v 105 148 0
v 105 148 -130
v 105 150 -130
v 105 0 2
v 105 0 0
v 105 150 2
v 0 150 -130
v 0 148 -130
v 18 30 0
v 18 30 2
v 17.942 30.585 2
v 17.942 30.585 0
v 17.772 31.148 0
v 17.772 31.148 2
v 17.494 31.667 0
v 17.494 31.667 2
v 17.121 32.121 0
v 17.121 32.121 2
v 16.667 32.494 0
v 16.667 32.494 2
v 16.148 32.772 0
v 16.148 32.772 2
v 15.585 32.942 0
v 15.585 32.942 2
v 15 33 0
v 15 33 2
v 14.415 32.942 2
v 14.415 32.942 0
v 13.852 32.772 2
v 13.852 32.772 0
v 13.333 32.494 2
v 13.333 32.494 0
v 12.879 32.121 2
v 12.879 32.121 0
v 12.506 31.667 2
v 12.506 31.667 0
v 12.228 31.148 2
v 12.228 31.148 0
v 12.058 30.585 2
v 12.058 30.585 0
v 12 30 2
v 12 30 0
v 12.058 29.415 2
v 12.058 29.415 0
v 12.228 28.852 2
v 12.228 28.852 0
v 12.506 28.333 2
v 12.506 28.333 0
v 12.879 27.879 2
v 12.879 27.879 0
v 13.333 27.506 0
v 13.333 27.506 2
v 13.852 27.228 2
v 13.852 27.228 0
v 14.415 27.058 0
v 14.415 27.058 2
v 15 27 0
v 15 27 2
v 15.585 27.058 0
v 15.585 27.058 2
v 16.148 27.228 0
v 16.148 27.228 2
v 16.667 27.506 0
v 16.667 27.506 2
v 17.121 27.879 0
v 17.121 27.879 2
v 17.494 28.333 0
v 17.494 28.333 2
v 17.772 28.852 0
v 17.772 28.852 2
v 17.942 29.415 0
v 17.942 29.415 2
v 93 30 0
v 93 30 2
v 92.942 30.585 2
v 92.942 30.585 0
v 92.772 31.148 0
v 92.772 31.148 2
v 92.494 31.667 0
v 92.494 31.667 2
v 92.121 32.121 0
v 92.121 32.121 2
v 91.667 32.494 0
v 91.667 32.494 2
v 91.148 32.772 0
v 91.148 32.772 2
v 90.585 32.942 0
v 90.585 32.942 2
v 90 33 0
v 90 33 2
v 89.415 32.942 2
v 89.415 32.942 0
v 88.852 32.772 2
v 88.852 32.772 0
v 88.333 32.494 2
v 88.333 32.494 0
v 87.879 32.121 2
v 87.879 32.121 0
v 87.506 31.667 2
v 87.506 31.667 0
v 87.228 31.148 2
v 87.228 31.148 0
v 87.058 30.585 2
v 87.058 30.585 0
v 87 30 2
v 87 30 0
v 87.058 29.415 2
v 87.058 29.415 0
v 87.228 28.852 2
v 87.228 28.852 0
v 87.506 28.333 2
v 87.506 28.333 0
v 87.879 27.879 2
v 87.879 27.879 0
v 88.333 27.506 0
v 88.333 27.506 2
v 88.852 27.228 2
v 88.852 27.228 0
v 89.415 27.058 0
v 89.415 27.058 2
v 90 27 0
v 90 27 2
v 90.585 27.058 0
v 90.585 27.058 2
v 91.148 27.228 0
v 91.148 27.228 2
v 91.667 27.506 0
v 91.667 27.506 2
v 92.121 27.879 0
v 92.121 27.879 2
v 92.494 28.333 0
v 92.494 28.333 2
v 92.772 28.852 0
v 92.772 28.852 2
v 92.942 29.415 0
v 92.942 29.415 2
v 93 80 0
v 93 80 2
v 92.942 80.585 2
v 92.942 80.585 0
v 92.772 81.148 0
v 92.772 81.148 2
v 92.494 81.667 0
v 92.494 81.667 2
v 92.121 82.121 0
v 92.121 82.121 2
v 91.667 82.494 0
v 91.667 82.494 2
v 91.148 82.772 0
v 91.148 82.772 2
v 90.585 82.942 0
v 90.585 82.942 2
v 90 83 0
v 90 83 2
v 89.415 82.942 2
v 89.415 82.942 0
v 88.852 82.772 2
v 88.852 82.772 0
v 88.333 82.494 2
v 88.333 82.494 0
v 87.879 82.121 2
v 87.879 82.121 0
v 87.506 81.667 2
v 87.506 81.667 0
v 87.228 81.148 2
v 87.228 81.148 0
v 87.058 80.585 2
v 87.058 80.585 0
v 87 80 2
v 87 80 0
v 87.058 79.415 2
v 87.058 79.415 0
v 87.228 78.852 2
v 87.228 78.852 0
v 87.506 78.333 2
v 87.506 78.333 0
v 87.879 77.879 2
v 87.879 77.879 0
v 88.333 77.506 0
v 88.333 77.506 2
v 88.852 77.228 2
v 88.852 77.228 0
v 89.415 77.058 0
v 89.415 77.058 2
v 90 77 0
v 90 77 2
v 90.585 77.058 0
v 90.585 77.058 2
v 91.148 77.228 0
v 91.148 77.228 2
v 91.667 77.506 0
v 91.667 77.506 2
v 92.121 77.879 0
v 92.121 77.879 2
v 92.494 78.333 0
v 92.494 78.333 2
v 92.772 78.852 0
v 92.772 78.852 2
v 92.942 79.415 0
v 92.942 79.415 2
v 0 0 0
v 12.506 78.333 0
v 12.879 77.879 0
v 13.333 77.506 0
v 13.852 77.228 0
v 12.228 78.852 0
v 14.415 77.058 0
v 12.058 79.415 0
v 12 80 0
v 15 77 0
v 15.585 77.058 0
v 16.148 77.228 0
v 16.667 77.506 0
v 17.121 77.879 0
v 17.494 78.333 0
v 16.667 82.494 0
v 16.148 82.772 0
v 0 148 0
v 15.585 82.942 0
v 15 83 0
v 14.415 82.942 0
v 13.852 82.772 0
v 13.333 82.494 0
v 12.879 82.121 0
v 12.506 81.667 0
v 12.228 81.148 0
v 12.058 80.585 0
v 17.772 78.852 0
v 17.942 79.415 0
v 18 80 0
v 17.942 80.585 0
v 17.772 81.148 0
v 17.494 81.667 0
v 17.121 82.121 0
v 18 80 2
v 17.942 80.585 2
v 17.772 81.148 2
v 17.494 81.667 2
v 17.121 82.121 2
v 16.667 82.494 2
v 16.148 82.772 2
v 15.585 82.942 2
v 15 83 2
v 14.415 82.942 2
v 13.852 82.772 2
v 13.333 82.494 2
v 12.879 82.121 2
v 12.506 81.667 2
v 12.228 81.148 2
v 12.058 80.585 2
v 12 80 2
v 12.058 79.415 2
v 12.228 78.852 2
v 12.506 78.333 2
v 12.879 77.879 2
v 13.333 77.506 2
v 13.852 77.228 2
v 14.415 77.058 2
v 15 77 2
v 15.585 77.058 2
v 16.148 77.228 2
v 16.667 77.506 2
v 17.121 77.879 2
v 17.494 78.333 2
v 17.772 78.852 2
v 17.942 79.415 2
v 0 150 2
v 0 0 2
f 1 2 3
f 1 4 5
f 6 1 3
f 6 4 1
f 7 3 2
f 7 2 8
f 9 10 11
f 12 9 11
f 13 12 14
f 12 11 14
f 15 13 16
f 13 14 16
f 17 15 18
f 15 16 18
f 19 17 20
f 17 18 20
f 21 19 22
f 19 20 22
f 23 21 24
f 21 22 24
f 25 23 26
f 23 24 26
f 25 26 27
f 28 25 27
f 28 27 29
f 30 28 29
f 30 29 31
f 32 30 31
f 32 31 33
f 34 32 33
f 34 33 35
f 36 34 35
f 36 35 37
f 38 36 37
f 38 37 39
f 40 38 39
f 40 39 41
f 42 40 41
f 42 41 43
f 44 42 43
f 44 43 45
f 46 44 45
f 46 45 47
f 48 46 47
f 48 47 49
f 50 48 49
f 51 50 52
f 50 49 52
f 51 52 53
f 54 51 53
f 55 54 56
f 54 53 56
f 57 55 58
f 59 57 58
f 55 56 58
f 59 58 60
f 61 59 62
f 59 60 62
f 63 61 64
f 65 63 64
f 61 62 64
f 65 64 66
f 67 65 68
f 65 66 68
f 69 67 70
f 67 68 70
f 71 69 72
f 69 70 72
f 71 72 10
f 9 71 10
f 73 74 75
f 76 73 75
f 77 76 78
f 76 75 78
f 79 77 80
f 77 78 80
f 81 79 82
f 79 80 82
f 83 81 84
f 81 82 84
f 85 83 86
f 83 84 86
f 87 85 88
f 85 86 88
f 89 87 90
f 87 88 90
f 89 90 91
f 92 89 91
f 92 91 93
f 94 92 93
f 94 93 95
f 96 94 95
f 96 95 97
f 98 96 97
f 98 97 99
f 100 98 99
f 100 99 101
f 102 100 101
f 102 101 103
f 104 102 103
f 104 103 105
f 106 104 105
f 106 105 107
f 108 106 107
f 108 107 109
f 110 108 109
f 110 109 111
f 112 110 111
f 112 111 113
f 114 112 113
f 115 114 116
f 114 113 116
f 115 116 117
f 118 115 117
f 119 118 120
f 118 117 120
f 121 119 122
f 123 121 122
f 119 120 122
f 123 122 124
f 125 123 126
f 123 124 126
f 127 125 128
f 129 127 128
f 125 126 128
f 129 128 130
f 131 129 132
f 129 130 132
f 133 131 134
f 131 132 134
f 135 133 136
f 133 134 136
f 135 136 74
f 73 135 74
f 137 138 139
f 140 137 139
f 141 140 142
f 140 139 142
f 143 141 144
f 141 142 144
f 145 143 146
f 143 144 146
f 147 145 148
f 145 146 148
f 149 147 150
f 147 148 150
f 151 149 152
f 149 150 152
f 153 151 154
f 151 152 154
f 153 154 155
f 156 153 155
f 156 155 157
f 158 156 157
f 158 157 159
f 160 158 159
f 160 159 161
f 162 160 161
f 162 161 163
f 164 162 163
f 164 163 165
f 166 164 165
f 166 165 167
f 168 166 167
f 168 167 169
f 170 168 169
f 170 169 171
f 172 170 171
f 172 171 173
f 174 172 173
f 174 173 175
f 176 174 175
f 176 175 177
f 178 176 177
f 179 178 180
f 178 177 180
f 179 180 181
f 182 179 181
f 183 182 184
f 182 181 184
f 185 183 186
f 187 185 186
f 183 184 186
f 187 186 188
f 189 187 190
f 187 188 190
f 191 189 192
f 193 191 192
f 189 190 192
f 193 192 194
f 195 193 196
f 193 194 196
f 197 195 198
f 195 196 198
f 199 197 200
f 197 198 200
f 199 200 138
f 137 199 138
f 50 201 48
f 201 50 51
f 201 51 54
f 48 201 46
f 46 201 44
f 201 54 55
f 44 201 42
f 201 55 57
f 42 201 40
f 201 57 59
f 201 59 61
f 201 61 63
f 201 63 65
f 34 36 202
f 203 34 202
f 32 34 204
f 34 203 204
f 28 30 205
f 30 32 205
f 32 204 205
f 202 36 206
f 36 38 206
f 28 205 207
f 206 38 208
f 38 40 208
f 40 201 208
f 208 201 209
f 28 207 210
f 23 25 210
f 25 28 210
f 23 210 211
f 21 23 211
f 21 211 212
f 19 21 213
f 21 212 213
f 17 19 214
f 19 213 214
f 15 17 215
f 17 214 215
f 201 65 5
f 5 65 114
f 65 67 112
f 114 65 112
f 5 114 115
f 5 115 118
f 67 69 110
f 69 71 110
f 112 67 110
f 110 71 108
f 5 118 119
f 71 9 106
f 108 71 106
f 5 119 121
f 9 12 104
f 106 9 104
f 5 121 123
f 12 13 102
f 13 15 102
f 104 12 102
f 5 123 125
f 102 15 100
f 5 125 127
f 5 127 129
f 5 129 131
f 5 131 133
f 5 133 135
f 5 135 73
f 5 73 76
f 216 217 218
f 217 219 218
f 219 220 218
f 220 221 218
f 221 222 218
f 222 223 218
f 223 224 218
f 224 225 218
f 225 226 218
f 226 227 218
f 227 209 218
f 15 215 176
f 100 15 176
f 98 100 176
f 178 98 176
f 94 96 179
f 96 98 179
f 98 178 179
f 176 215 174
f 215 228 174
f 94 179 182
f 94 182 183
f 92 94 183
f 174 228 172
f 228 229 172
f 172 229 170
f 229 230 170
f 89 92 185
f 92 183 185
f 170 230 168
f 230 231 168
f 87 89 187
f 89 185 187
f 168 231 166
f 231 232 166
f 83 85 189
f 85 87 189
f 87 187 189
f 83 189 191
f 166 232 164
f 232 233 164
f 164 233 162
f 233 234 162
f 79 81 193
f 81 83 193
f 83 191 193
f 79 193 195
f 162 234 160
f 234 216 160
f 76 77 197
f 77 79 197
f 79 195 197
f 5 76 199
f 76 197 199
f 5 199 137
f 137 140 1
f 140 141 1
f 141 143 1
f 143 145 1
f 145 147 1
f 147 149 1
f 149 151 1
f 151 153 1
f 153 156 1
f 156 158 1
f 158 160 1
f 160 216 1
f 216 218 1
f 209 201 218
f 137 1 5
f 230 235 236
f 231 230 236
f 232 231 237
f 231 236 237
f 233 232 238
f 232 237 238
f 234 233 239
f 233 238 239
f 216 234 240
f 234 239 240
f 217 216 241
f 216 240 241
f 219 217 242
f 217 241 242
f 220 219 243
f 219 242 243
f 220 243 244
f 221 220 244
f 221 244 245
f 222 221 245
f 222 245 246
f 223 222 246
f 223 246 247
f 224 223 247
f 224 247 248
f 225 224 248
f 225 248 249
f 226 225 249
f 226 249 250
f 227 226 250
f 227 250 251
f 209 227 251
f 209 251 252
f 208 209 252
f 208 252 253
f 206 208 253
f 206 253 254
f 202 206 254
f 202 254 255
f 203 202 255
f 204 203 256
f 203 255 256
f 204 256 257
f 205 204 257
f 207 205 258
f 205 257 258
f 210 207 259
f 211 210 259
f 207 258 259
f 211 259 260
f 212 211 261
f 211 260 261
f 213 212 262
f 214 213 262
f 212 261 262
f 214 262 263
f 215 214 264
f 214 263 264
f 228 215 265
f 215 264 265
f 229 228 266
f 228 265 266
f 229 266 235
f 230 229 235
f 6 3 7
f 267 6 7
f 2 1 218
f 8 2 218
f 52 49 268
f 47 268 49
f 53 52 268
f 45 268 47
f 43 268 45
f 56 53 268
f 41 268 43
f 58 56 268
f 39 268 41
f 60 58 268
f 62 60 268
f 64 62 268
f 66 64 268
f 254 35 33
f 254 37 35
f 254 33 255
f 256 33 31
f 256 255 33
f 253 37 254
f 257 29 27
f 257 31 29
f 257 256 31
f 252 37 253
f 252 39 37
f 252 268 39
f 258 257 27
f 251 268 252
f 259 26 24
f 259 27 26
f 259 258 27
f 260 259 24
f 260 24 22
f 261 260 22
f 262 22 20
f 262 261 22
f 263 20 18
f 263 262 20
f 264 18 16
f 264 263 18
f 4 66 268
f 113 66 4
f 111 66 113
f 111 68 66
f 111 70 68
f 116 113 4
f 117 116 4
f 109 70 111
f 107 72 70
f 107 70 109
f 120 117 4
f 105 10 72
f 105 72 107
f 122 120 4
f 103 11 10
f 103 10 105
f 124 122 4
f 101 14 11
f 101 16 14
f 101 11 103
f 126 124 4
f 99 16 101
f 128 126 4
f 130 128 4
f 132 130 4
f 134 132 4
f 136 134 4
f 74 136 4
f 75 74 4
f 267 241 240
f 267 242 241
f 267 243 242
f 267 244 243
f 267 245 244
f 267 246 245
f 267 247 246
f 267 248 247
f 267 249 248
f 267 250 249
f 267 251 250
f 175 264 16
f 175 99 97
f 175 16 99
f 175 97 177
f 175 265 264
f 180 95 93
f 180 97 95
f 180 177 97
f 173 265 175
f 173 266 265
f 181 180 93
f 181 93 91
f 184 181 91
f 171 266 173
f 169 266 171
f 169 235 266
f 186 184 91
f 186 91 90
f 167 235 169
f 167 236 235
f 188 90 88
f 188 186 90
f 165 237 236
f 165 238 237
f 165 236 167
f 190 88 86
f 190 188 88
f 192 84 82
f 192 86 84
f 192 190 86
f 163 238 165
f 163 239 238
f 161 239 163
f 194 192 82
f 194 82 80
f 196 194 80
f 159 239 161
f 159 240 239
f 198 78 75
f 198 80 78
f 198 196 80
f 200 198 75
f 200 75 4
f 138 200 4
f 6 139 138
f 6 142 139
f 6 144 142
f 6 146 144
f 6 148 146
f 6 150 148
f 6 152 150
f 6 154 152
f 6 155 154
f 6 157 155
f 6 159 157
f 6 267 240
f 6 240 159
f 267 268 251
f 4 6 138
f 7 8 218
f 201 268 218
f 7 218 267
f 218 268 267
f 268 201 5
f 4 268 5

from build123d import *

# Parameters (mm, degrees)
SKETCH1_W           = 105
SKETCH1_H           = 150
BOSS_EXTRUDE1_DEPTH = 2
SKETCH2_W           = 105
SKETCH2_H           = 2
BOSS_EXTRUDE2_DEPTH = 130
SKETCH3_R           = 3
CUT_EXTRUDE1_DEPTH  = 10
SKETCH4_R           = 3
CUT_EXTRUDE2_DEPTH  = 10
SKETCH5_R           = 3
CUT_EXTRUDE3_DEPTH  = 10
SKETCH6_R           = 3
CUT_EXTRUDE4_DEPTH  = 10


with BuildPart() as part:
    # Sketch1 → Boss-Extrude1 (new body)
    with BuildSketch(Plane.XY):
        with Locations((52.5, 75)):
            Rectangle(SKETCH1_W, SKETCH1_H)
    extrude(amount=BOSS_EXTRUDE1_DEPTH)

    # Sketch2 → Boss-Extrude2 (add)
    with BuildSketch(Plane(origin=(0, 0, 0), x_dir=(-1, 0, 0), z_dir=(0, 0, -1))):
        with Locations((-52.5, 149)):
            Rectangle(SKETCH2_W, SKETCH2_H)
    extrude(amount=BOSS_EXTRUDE2_DEPTH)

    # Sketch3 → Cut-Extrude1 (cut)
    with BuildSketch(Plane.XY.offset(2)):
        with Locations((15, 30)):
            Circle(SKETCH3_R)
    extrude(amount=-CUT_EXTRUDE1_DEPTH, mode=Mode.SUBTRACT)

    # Sketch4 → Cut-Extrude2 (cut)
    with BuildSketch(Plane.XY.offset(2)):
        with Locations((90, 30)):
            Circle(SKETCH4_R)
    extrude(amount=-CUT_EXTRUDE2_DEPTH, mode=Mode.SUBTRACT)

    # Sketch5 → Cut-Extrude3 (cut)
    with BuildSketch(Plane.XY.offset(2)):
        with Locations((15, 80)):
            Circle(SKETCH5_R)
    extrude(amount=-CUT_EXTRUDE3_DEPTH, mode=Mode.SUBTRACT)

    # Sketch6 → Cut-Extrude4 (cut)
    with BuildSketch(Plane.XY.offset(2)):
        with Locations((90, 80)):
            Circle(SKETCH6_R)
    extrude(amount=-CUT_EXTRUDE4_DEPTH, mode=Mode.SUBTRACT)


solid = part.part
